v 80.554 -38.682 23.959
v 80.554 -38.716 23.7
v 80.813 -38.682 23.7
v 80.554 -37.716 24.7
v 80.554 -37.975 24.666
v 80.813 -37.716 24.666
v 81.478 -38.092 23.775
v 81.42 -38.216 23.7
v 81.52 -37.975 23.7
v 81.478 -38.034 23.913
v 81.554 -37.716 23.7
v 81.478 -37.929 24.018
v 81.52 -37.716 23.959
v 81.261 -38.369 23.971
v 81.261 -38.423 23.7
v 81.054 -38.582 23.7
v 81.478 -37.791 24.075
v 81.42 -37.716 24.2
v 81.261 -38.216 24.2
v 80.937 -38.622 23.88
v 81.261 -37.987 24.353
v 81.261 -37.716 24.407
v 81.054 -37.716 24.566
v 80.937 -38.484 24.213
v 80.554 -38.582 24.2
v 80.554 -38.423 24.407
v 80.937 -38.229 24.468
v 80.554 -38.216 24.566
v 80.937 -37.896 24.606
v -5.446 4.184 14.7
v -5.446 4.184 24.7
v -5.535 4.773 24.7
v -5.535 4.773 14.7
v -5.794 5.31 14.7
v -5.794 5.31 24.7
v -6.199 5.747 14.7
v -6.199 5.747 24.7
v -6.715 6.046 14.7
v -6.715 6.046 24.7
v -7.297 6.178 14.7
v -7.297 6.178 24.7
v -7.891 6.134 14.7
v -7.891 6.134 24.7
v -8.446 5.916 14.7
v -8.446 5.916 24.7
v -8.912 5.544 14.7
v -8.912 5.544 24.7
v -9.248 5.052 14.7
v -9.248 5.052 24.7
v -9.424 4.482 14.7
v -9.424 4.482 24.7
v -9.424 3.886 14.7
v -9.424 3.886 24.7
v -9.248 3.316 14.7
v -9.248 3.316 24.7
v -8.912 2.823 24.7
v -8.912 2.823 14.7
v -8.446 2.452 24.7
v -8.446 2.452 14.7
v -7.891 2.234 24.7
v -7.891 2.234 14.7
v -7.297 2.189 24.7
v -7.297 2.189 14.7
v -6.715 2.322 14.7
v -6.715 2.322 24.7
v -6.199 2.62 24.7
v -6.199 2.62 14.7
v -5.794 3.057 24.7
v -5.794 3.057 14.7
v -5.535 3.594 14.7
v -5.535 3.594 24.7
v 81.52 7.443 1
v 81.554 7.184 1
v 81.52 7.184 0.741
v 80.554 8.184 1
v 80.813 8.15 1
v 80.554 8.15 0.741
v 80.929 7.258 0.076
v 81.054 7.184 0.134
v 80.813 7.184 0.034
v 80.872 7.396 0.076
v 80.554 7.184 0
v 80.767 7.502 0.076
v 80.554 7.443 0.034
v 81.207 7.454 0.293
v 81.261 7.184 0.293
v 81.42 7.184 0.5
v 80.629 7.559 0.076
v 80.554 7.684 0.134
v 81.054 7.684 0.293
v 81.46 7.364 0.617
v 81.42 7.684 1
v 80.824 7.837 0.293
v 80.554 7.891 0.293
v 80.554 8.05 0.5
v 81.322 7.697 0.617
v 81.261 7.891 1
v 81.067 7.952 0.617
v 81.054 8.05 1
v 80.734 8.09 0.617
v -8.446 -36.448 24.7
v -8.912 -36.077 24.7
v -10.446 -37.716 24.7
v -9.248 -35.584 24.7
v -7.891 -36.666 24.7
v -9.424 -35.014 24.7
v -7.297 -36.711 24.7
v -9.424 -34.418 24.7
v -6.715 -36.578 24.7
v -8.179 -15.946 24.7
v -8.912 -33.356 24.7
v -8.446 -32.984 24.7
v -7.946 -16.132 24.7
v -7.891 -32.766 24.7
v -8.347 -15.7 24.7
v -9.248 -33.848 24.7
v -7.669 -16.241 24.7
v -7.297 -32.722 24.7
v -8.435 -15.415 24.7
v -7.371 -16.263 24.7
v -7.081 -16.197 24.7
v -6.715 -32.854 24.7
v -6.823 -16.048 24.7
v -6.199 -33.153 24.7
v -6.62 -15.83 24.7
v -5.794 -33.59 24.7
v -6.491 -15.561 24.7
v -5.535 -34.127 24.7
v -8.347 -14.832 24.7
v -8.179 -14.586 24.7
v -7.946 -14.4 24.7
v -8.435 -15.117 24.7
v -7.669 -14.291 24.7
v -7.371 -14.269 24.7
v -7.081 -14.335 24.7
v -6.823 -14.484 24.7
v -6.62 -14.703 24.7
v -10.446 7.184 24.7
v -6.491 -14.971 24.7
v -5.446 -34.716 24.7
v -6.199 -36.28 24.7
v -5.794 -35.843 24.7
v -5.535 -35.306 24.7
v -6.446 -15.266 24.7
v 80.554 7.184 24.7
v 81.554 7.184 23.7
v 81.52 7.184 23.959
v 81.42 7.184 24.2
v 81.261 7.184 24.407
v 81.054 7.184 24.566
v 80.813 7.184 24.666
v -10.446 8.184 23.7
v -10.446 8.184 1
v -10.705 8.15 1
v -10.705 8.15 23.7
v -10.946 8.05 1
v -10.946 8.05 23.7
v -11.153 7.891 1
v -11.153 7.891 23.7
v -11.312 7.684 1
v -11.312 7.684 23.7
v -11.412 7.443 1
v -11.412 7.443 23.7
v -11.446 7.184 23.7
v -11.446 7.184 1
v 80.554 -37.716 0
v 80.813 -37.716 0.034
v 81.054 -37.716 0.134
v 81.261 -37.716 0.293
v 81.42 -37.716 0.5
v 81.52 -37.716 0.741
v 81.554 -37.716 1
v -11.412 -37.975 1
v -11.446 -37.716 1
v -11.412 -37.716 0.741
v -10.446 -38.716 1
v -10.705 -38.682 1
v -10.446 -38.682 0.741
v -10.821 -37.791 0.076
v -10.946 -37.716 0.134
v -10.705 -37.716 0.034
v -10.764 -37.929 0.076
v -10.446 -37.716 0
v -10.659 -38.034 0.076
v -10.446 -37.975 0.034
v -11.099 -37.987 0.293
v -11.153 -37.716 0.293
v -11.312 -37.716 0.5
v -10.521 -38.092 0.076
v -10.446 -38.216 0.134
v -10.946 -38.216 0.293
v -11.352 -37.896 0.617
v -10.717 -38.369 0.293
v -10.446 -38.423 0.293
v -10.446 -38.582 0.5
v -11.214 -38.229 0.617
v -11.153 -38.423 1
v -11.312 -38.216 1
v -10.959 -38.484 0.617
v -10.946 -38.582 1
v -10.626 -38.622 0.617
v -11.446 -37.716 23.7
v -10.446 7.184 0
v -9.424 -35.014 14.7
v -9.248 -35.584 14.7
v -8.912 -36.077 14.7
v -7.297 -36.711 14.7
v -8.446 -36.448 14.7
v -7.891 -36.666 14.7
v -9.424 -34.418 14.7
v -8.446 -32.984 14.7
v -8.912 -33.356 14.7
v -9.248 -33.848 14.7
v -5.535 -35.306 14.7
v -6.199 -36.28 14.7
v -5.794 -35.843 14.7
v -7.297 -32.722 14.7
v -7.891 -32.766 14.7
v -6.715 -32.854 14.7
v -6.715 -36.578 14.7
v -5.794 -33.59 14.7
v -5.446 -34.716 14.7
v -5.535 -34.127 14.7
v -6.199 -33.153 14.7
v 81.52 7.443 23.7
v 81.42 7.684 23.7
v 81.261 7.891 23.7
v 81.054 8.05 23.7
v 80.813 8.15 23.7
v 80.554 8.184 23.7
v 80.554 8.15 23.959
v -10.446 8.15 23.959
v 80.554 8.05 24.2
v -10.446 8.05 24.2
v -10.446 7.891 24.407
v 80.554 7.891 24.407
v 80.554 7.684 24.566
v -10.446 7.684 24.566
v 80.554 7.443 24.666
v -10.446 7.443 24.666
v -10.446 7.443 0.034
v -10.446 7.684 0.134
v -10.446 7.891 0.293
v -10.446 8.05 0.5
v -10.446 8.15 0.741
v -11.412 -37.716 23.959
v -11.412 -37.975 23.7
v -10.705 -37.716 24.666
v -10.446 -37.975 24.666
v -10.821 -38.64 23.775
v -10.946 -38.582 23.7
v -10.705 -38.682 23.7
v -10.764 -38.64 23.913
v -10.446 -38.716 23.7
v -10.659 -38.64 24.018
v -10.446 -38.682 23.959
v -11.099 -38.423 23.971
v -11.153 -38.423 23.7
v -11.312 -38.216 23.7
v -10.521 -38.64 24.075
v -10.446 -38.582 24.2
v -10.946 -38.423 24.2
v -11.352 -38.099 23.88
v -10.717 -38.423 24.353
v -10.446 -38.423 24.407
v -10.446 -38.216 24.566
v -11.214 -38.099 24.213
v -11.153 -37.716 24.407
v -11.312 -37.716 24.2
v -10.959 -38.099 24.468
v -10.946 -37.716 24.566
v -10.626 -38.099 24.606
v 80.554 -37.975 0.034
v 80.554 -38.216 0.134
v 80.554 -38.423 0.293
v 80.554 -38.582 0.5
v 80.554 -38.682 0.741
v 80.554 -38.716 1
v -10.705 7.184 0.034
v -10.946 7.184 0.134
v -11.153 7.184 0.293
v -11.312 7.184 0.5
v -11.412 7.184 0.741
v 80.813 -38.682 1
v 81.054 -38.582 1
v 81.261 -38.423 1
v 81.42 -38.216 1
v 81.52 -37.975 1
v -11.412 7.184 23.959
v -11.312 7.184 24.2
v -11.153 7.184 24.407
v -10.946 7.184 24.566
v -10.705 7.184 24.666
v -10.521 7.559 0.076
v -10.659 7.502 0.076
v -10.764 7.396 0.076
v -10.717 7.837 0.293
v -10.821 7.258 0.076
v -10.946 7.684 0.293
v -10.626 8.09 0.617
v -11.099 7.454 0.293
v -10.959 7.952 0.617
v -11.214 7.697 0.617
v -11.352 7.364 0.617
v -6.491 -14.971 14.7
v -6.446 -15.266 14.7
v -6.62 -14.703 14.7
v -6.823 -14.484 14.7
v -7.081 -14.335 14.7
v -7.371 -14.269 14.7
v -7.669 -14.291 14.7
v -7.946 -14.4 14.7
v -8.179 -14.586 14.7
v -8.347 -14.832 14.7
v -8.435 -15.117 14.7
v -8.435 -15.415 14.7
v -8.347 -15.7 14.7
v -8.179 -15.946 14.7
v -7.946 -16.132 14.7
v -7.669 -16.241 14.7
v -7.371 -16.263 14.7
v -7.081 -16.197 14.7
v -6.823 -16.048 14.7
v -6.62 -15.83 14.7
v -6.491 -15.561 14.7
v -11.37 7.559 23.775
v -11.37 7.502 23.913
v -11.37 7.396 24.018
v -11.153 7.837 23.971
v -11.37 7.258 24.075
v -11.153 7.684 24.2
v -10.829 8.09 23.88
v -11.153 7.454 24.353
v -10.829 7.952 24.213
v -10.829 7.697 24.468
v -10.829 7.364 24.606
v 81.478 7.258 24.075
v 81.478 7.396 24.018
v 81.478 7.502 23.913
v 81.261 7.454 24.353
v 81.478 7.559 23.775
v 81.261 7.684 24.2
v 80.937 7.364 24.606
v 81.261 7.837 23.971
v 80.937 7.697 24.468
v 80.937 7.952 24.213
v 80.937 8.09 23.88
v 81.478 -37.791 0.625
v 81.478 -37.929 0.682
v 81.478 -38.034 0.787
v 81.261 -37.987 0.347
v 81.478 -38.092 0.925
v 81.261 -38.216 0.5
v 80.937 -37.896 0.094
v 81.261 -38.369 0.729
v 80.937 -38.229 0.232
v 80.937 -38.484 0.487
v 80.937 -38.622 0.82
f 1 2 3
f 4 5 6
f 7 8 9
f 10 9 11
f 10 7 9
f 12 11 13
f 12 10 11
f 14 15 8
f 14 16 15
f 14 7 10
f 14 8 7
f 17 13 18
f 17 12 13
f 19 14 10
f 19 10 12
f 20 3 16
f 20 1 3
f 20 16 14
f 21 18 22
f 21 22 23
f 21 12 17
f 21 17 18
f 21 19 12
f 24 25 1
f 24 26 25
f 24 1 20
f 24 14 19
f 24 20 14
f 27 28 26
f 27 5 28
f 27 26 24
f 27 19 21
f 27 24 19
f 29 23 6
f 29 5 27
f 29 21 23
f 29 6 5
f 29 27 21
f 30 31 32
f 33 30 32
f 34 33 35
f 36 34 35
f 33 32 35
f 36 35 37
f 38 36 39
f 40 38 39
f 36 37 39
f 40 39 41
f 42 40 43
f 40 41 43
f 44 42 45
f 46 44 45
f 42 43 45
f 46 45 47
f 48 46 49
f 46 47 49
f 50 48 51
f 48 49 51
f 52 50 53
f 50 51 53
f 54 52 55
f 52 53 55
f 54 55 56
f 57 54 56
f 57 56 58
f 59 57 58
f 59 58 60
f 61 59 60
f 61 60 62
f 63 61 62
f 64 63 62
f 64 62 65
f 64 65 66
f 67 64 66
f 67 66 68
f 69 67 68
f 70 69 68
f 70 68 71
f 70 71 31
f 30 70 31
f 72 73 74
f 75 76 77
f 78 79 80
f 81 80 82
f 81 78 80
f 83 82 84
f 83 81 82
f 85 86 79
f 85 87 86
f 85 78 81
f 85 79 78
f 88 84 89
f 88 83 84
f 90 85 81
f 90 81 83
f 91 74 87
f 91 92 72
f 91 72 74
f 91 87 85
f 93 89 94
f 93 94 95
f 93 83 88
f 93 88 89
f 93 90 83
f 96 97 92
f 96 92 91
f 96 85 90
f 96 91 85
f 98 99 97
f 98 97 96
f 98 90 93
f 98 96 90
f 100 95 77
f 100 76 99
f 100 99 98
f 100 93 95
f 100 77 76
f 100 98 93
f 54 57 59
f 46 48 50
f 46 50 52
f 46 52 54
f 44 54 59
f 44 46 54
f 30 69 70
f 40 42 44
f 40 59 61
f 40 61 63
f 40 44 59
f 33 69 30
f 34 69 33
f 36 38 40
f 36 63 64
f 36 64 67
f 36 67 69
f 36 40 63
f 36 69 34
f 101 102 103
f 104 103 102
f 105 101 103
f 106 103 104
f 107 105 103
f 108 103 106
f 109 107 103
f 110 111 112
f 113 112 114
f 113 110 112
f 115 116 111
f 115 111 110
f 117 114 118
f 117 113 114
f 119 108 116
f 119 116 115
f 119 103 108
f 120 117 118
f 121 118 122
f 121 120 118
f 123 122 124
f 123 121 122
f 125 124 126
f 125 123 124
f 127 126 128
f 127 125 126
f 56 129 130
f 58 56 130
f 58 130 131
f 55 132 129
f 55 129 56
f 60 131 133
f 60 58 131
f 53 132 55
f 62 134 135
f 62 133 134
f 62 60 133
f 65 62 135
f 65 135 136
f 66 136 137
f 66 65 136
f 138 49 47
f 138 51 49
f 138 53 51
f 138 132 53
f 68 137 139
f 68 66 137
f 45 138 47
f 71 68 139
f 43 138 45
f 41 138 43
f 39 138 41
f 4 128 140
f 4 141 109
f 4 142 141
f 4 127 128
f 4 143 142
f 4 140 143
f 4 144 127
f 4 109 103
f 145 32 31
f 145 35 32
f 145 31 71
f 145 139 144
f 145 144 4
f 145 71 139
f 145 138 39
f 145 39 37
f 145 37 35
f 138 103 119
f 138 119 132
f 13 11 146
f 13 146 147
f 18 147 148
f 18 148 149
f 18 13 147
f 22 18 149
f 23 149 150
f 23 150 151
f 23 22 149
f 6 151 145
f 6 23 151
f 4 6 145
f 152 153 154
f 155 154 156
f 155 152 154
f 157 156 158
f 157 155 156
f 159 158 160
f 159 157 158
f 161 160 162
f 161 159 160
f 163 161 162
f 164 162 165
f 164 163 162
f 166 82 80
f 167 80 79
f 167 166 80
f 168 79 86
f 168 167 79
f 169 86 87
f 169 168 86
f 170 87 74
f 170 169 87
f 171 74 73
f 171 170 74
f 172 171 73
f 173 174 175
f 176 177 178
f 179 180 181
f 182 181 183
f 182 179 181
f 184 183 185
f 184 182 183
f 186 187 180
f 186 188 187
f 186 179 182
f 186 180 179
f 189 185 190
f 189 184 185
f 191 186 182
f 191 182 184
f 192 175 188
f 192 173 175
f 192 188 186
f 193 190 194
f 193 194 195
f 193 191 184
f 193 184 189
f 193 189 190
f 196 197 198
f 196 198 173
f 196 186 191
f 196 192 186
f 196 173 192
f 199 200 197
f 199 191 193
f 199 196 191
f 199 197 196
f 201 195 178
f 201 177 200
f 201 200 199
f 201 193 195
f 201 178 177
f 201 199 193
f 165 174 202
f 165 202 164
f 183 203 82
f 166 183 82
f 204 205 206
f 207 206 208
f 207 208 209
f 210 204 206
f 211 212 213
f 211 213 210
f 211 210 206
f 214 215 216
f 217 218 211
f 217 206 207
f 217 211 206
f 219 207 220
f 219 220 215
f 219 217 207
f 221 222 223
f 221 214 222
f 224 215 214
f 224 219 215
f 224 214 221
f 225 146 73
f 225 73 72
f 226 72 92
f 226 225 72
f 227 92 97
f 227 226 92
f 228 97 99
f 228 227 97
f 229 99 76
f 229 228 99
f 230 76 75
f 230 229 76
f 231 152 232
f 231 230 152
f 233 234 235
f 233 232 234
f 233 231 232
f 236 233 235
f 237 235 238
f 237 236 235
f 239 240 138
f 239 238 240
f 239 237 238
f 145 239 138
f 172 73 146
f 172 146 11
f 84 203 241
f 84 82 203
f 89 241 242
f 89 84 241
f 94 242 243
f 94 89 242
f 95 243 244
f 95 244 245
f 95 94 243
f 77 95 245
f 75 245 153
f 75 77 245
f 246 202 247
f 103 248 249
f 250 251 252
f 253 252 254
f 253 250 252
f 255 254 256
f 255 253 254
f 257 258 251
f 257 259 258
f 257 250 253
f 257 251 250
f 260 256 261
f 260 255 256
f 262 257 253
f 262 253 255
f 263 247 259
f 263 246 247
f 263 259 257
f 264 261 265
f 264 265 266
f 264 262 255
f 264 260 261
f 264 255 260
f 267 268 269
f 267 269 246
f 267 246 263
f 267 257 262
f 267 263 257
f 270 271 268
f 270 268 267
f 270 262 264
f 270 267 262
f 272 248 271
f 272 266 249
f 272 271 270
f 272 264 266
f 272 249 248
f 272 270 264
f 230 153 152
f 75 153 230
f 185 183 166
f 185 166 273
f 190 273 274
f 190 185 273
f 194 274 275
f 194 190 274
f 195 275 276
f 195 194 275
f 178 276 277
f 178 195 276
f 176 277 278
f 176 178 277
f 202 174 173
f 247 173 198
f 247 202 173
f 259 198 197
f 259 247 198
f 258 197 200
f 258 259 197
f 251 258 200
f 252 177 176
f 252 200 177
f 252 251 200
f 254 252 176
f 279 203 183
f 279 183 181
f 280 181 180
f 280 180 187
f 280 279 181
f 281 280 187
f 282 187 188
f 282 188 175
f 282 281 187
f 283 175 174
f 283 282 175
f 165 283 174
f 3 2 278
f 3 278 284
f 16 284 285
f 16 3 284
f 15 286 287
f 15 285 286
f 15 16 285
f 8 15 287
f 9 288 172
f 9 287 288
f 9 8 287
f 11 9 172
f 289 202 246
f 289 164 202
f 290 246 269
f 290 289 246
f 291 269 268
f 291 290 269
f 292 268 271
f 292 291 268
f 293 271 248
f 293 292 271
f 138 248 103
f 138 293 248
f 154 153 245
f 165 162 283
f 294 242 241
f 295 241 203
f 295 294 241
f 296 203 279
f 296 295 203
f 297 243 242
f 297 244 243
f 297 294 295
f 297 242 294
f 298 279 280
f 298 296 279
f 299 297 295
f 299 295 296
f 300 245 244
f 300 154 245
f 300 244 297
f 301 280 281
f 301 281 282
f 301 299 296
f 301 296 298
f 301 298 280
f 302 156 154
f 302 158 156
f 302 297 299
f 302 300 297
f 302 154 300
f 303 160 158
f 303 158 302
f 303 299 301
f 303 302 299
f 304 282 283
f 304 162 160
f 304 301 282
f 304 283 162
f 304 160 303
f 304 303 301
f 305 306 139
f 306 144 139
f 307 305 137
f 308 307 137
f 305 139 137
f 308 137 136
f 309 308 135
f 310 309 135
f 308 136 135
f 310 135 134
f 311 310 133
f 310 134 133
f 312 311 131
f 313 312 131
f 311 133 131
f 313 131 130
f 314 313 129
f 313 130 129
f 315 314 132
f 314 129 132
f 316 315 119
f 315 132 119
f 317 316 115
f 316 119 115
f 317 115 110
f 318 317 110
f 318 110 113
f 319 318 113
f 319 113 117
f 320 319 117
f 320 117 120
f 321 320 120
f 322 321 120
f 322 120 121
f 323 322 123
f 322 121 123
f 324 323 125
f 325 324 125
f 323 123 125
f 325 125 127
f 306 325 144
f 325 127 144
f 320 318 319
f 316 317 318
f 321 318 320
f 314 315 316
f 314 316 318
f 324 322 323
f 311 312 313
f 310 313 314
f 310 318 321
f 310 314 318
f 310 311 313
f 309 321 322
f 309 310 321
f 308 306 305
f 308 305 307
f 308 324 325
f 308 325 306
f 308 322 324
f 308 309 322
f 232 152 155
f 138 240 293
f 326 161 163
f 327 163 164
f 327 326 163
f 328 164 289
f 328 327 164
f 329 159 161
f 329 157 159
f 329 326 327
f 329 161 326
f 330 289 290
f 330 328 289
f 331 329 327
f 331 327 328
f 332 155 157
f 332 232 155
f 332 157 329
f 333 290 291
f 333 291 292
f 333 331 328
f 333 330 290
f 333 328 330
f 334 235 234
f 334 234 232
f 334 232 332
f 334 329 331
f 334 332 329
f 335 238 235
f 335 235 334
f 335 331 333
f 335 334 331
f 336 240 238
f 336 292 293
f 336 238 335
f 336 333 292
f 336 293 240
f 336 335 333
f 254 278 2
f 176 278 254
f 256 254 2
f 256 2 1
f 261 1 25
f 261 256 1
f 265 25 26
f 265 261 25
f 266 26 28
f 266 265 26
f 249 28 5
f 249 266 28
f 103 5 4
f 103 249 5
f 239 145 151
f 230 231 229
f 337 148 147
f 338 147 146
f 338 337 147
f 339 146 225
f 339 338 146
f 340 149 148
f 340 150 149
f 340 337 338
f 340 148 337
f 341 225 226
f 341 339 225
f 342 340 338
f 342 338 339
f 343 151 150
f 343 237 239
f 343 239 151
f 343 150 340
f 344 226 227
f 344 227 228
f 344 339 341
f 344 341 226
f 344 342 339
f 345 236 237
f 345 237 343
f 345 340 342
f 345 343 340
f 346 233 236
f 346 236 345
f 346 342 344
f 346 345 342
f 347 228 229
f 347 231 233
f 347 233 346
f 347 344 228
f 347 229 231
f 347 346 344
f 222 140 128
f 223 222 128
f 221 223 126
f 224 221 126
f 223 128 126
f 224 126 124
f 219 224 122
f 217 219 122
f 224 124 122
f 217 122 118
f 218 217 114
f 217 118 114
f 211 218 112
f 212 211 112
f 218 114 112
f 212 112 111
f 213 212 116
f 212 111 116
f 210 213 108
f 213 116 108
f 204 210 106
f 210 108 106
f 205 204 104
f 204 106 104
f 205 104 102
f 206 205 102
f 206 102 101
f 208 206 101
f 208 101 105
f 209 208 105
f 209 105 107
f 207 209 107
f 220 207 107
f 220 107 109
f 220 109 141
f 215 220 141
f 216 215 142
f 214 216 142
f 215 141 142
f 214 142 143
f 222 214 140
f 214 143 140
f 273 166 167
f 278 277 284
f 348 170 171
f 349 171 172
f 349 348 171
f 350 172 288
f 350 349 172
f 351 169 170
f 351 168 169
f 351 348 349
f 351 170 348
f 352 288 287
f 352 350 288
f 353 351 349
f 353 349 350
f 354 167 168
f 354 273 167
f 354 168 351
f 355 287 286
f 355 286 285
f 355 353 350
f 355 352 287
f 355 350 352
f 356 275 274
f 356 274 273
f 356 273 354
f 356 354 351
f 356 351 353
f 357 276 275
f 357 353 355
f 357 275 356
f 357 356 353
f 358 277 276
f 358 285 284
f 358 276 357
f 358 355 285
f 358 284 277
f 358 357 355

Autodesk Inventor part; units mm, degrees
ref_plane "YZ Plane" through (0, 0, 0) normal (1, 0, 0) x (0, 1, 0)
ref_plane "XZ Plane" through (0, 0, 0) normal (0, 1, 0) x (-1, 0, 0)
ref_plane "XY Plane" through (0, 0, 0) normal (0, 0, 1) x (1, 0, 0)
sketch "スケッチ1" plane through (0, 0, 0) normal (0, 0, 1) x (1, 0, 0)
  line L0 (-11.4461, 8.1838) -> (81.5539, 8.1838)
  line L1 (81.5539, 8.1838) -> (81.5539, -38.7162)
  line L2 (81.5539, -38.7162) -> (-11.4461, -38.7162)
  line L3 (-11.4461, -38.7162) -> (-11.4461, 8.1838)
  point P0 (0, 0)
  dimension "d0" = 93
  dimension "d1" = 46.9
extrude "押し出し1" add sketch "スケッチ1" along normal blind 24.7
fillet "フィレット1" radius 1 12 edges at (35.0539, 8.1838, 24.7) (-11.4461, -15.2662, 24.7) (-11.4461, 8.1838, 12.35) (35.0539, -38.7162, 24.7) (-11.4461, -38.7162, 12.35) (35.0539, -38.7162, 0) (81.5539, -38.7162, 12.35) (81.5539, -15.2662, 24.7) (81.5539, 8.1838, 12.35) (81.5539, -15.2662, 0) (35.0539, 8.1838, 0) (-11.4461, -15.2662, 0)
sketch "スケッチ2" plane through (0, 0, 24.7) normal (0, 0, 1) x (1, 0, 0)
  line L0 (-10.4461, -37.7162) -> (-10.4461, 7.1838) projected
  line L1 (80.5539, -37.7162) -> (-10.4461, -37.7162) projected
  line L2 (80.5539, 7.1838) -> (80.5539, -37.7162) projected
  line L3 (-10.4461, 7.1838) -> (80.5539, 7.1838) projected
  circle A0 centre (-7.4461, 4.1838) radius 2
  circle A1 centre (-7.4461, -34.7162) radius 2
  line L4 (-0.4461, 2.1838) -> (75.5539, 2.1838)
  line L5 (75.5539, 2.1838) -> (75.5539, -32.7162)
  line L6 (75.5539, -32.7162) -> (-0.4461, -32.7162)
  line L7 (-0.4461, -32.7162) -> (-0.4461, 2.1838)
  circle A2 centre (-7.4461, -15.2662) radius 1
  point P0 (0, 0)
  dimension "d5" = 4
  dimension "d6" = 4
  dimension "d7" = 3
  dimension "d8" = 3
  dimension "d9" = 3
  dimension "d10" = 3
  dimension "d11" = 5
  dimension "d12" = 5
  dimension "d13" = 5
  dimension "d14" = 10
  dimension "d15" = 2
extrude "押し出し2" cut sketch "スケッチ2" against normal blind 10 contours A0 | A1 | A2
sketch "スケッチ3" plane through (0, 0, 24.7) normal (0, 0, 1) x (1, 0, 0)
  line L0 (-2.3175, 1.7393) -> (76.8469, 1.7393) construction
  line L1 (76.8469, 1.7393) -> (76.8469, -32.2836) construction
  line L2 (76.8469, -32.2836) -> (-2.3175, -32.2836) construction
  line L3 (-2.3175, -32.2836) -> (-2.3175, 1.7393) construction
  point P0 (0, 0)
properties part number "BAKUSO"
